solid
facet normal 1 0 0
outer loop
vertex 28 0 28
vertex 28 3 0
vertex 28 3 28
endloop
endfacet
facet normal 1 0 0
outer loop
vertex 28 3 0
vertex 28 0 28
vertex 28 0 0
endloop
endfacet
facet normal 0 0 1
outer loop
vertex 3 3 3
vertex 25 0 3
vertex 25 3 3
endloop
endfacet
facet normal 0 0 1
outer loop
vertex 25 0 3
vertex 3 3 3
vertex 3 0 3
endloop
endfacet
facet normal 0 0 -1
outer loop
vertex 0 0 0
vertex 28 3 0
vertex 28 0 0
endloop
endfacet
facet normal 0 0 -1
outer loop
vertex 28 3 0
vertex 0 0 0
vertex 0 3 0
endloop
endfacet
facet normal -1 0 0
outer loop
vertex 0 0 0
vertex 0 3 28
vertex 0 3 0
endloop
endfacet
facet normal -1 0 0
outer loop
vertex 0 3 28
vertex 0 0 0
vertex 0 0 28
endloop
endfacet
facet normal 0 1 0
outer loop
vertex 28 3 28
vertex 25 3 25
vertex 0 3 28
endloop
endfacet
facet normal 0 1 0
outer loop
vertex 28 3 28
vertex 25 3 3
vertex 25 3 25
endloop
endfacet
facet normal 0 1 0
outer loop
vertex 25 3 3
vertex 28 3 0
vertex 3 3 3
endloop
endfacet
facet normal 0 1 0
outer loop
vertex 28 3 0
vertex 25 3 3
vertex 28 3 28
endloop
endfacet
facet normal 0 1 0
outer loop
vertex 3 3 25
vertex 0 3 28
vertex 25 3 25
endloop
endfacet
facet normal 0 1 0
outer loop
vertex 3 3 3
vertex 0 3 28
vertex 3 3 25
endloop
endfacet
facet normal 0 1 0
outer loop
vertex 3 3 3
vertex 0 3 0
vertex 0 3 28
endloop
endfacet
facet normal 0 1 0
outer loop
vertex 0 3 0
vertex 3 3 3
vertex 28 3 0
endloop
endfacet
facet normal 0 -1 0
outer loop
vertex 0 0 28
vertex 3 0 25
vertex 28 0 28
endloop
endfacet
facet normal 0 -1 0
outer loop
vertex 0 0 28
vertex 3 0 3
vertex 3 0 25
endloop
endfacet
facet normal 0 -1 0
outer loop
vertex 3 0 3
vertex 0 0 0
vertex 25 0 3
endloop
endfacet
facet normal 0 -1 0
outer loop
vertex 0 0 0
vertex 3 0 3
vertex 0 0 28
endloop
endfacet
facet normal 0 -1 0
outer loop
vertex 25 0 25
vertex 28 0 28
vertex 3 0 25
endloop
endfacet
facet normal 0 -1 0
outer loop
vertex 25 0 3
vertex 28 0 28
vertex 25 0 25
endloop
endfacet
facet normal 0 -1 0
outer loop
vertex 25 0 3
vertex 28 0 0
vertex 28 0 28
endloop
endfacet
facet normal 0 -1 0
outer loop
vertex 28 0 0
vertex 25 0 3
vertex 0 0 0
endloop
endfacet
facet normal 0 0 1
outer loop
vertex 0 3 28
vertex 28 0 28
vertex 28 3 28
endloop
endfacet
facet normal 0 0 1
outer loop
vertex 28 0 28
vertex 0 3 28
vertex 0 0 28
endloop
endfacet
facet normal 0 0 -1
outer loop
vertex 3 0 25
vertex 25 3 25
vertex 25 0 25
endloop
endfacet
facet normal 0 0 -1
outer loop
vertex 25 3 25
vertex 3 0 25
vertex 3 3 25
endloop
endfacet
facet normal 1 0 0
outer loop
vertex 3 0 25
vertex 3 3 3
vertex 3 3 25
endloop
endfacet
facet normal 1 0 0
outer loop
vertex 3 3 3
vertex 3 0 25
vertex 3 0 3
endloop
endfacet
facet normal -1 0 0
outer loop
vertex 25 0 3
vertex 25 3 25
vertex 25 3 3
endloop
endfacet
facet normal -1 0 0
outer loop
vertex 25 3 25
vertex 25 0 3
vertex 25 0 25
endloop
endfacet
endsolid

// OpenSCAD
// U-shaped spring clip.
$fn = 60;
eps = 0.02;
clip_w = 28;
clip_h = 28;
clip_t = 3;
union() { cube([clip_w,clip_t,clip_t]); translate([0,0,clip_h-clip_t]) cube([clip_w,clip_t,clip_t]); cube([clip_t,clip_t,clip_h]); translate([clip_w-clip_t,0,0]) cube([clip_t,clip_t,clip_h]); }
